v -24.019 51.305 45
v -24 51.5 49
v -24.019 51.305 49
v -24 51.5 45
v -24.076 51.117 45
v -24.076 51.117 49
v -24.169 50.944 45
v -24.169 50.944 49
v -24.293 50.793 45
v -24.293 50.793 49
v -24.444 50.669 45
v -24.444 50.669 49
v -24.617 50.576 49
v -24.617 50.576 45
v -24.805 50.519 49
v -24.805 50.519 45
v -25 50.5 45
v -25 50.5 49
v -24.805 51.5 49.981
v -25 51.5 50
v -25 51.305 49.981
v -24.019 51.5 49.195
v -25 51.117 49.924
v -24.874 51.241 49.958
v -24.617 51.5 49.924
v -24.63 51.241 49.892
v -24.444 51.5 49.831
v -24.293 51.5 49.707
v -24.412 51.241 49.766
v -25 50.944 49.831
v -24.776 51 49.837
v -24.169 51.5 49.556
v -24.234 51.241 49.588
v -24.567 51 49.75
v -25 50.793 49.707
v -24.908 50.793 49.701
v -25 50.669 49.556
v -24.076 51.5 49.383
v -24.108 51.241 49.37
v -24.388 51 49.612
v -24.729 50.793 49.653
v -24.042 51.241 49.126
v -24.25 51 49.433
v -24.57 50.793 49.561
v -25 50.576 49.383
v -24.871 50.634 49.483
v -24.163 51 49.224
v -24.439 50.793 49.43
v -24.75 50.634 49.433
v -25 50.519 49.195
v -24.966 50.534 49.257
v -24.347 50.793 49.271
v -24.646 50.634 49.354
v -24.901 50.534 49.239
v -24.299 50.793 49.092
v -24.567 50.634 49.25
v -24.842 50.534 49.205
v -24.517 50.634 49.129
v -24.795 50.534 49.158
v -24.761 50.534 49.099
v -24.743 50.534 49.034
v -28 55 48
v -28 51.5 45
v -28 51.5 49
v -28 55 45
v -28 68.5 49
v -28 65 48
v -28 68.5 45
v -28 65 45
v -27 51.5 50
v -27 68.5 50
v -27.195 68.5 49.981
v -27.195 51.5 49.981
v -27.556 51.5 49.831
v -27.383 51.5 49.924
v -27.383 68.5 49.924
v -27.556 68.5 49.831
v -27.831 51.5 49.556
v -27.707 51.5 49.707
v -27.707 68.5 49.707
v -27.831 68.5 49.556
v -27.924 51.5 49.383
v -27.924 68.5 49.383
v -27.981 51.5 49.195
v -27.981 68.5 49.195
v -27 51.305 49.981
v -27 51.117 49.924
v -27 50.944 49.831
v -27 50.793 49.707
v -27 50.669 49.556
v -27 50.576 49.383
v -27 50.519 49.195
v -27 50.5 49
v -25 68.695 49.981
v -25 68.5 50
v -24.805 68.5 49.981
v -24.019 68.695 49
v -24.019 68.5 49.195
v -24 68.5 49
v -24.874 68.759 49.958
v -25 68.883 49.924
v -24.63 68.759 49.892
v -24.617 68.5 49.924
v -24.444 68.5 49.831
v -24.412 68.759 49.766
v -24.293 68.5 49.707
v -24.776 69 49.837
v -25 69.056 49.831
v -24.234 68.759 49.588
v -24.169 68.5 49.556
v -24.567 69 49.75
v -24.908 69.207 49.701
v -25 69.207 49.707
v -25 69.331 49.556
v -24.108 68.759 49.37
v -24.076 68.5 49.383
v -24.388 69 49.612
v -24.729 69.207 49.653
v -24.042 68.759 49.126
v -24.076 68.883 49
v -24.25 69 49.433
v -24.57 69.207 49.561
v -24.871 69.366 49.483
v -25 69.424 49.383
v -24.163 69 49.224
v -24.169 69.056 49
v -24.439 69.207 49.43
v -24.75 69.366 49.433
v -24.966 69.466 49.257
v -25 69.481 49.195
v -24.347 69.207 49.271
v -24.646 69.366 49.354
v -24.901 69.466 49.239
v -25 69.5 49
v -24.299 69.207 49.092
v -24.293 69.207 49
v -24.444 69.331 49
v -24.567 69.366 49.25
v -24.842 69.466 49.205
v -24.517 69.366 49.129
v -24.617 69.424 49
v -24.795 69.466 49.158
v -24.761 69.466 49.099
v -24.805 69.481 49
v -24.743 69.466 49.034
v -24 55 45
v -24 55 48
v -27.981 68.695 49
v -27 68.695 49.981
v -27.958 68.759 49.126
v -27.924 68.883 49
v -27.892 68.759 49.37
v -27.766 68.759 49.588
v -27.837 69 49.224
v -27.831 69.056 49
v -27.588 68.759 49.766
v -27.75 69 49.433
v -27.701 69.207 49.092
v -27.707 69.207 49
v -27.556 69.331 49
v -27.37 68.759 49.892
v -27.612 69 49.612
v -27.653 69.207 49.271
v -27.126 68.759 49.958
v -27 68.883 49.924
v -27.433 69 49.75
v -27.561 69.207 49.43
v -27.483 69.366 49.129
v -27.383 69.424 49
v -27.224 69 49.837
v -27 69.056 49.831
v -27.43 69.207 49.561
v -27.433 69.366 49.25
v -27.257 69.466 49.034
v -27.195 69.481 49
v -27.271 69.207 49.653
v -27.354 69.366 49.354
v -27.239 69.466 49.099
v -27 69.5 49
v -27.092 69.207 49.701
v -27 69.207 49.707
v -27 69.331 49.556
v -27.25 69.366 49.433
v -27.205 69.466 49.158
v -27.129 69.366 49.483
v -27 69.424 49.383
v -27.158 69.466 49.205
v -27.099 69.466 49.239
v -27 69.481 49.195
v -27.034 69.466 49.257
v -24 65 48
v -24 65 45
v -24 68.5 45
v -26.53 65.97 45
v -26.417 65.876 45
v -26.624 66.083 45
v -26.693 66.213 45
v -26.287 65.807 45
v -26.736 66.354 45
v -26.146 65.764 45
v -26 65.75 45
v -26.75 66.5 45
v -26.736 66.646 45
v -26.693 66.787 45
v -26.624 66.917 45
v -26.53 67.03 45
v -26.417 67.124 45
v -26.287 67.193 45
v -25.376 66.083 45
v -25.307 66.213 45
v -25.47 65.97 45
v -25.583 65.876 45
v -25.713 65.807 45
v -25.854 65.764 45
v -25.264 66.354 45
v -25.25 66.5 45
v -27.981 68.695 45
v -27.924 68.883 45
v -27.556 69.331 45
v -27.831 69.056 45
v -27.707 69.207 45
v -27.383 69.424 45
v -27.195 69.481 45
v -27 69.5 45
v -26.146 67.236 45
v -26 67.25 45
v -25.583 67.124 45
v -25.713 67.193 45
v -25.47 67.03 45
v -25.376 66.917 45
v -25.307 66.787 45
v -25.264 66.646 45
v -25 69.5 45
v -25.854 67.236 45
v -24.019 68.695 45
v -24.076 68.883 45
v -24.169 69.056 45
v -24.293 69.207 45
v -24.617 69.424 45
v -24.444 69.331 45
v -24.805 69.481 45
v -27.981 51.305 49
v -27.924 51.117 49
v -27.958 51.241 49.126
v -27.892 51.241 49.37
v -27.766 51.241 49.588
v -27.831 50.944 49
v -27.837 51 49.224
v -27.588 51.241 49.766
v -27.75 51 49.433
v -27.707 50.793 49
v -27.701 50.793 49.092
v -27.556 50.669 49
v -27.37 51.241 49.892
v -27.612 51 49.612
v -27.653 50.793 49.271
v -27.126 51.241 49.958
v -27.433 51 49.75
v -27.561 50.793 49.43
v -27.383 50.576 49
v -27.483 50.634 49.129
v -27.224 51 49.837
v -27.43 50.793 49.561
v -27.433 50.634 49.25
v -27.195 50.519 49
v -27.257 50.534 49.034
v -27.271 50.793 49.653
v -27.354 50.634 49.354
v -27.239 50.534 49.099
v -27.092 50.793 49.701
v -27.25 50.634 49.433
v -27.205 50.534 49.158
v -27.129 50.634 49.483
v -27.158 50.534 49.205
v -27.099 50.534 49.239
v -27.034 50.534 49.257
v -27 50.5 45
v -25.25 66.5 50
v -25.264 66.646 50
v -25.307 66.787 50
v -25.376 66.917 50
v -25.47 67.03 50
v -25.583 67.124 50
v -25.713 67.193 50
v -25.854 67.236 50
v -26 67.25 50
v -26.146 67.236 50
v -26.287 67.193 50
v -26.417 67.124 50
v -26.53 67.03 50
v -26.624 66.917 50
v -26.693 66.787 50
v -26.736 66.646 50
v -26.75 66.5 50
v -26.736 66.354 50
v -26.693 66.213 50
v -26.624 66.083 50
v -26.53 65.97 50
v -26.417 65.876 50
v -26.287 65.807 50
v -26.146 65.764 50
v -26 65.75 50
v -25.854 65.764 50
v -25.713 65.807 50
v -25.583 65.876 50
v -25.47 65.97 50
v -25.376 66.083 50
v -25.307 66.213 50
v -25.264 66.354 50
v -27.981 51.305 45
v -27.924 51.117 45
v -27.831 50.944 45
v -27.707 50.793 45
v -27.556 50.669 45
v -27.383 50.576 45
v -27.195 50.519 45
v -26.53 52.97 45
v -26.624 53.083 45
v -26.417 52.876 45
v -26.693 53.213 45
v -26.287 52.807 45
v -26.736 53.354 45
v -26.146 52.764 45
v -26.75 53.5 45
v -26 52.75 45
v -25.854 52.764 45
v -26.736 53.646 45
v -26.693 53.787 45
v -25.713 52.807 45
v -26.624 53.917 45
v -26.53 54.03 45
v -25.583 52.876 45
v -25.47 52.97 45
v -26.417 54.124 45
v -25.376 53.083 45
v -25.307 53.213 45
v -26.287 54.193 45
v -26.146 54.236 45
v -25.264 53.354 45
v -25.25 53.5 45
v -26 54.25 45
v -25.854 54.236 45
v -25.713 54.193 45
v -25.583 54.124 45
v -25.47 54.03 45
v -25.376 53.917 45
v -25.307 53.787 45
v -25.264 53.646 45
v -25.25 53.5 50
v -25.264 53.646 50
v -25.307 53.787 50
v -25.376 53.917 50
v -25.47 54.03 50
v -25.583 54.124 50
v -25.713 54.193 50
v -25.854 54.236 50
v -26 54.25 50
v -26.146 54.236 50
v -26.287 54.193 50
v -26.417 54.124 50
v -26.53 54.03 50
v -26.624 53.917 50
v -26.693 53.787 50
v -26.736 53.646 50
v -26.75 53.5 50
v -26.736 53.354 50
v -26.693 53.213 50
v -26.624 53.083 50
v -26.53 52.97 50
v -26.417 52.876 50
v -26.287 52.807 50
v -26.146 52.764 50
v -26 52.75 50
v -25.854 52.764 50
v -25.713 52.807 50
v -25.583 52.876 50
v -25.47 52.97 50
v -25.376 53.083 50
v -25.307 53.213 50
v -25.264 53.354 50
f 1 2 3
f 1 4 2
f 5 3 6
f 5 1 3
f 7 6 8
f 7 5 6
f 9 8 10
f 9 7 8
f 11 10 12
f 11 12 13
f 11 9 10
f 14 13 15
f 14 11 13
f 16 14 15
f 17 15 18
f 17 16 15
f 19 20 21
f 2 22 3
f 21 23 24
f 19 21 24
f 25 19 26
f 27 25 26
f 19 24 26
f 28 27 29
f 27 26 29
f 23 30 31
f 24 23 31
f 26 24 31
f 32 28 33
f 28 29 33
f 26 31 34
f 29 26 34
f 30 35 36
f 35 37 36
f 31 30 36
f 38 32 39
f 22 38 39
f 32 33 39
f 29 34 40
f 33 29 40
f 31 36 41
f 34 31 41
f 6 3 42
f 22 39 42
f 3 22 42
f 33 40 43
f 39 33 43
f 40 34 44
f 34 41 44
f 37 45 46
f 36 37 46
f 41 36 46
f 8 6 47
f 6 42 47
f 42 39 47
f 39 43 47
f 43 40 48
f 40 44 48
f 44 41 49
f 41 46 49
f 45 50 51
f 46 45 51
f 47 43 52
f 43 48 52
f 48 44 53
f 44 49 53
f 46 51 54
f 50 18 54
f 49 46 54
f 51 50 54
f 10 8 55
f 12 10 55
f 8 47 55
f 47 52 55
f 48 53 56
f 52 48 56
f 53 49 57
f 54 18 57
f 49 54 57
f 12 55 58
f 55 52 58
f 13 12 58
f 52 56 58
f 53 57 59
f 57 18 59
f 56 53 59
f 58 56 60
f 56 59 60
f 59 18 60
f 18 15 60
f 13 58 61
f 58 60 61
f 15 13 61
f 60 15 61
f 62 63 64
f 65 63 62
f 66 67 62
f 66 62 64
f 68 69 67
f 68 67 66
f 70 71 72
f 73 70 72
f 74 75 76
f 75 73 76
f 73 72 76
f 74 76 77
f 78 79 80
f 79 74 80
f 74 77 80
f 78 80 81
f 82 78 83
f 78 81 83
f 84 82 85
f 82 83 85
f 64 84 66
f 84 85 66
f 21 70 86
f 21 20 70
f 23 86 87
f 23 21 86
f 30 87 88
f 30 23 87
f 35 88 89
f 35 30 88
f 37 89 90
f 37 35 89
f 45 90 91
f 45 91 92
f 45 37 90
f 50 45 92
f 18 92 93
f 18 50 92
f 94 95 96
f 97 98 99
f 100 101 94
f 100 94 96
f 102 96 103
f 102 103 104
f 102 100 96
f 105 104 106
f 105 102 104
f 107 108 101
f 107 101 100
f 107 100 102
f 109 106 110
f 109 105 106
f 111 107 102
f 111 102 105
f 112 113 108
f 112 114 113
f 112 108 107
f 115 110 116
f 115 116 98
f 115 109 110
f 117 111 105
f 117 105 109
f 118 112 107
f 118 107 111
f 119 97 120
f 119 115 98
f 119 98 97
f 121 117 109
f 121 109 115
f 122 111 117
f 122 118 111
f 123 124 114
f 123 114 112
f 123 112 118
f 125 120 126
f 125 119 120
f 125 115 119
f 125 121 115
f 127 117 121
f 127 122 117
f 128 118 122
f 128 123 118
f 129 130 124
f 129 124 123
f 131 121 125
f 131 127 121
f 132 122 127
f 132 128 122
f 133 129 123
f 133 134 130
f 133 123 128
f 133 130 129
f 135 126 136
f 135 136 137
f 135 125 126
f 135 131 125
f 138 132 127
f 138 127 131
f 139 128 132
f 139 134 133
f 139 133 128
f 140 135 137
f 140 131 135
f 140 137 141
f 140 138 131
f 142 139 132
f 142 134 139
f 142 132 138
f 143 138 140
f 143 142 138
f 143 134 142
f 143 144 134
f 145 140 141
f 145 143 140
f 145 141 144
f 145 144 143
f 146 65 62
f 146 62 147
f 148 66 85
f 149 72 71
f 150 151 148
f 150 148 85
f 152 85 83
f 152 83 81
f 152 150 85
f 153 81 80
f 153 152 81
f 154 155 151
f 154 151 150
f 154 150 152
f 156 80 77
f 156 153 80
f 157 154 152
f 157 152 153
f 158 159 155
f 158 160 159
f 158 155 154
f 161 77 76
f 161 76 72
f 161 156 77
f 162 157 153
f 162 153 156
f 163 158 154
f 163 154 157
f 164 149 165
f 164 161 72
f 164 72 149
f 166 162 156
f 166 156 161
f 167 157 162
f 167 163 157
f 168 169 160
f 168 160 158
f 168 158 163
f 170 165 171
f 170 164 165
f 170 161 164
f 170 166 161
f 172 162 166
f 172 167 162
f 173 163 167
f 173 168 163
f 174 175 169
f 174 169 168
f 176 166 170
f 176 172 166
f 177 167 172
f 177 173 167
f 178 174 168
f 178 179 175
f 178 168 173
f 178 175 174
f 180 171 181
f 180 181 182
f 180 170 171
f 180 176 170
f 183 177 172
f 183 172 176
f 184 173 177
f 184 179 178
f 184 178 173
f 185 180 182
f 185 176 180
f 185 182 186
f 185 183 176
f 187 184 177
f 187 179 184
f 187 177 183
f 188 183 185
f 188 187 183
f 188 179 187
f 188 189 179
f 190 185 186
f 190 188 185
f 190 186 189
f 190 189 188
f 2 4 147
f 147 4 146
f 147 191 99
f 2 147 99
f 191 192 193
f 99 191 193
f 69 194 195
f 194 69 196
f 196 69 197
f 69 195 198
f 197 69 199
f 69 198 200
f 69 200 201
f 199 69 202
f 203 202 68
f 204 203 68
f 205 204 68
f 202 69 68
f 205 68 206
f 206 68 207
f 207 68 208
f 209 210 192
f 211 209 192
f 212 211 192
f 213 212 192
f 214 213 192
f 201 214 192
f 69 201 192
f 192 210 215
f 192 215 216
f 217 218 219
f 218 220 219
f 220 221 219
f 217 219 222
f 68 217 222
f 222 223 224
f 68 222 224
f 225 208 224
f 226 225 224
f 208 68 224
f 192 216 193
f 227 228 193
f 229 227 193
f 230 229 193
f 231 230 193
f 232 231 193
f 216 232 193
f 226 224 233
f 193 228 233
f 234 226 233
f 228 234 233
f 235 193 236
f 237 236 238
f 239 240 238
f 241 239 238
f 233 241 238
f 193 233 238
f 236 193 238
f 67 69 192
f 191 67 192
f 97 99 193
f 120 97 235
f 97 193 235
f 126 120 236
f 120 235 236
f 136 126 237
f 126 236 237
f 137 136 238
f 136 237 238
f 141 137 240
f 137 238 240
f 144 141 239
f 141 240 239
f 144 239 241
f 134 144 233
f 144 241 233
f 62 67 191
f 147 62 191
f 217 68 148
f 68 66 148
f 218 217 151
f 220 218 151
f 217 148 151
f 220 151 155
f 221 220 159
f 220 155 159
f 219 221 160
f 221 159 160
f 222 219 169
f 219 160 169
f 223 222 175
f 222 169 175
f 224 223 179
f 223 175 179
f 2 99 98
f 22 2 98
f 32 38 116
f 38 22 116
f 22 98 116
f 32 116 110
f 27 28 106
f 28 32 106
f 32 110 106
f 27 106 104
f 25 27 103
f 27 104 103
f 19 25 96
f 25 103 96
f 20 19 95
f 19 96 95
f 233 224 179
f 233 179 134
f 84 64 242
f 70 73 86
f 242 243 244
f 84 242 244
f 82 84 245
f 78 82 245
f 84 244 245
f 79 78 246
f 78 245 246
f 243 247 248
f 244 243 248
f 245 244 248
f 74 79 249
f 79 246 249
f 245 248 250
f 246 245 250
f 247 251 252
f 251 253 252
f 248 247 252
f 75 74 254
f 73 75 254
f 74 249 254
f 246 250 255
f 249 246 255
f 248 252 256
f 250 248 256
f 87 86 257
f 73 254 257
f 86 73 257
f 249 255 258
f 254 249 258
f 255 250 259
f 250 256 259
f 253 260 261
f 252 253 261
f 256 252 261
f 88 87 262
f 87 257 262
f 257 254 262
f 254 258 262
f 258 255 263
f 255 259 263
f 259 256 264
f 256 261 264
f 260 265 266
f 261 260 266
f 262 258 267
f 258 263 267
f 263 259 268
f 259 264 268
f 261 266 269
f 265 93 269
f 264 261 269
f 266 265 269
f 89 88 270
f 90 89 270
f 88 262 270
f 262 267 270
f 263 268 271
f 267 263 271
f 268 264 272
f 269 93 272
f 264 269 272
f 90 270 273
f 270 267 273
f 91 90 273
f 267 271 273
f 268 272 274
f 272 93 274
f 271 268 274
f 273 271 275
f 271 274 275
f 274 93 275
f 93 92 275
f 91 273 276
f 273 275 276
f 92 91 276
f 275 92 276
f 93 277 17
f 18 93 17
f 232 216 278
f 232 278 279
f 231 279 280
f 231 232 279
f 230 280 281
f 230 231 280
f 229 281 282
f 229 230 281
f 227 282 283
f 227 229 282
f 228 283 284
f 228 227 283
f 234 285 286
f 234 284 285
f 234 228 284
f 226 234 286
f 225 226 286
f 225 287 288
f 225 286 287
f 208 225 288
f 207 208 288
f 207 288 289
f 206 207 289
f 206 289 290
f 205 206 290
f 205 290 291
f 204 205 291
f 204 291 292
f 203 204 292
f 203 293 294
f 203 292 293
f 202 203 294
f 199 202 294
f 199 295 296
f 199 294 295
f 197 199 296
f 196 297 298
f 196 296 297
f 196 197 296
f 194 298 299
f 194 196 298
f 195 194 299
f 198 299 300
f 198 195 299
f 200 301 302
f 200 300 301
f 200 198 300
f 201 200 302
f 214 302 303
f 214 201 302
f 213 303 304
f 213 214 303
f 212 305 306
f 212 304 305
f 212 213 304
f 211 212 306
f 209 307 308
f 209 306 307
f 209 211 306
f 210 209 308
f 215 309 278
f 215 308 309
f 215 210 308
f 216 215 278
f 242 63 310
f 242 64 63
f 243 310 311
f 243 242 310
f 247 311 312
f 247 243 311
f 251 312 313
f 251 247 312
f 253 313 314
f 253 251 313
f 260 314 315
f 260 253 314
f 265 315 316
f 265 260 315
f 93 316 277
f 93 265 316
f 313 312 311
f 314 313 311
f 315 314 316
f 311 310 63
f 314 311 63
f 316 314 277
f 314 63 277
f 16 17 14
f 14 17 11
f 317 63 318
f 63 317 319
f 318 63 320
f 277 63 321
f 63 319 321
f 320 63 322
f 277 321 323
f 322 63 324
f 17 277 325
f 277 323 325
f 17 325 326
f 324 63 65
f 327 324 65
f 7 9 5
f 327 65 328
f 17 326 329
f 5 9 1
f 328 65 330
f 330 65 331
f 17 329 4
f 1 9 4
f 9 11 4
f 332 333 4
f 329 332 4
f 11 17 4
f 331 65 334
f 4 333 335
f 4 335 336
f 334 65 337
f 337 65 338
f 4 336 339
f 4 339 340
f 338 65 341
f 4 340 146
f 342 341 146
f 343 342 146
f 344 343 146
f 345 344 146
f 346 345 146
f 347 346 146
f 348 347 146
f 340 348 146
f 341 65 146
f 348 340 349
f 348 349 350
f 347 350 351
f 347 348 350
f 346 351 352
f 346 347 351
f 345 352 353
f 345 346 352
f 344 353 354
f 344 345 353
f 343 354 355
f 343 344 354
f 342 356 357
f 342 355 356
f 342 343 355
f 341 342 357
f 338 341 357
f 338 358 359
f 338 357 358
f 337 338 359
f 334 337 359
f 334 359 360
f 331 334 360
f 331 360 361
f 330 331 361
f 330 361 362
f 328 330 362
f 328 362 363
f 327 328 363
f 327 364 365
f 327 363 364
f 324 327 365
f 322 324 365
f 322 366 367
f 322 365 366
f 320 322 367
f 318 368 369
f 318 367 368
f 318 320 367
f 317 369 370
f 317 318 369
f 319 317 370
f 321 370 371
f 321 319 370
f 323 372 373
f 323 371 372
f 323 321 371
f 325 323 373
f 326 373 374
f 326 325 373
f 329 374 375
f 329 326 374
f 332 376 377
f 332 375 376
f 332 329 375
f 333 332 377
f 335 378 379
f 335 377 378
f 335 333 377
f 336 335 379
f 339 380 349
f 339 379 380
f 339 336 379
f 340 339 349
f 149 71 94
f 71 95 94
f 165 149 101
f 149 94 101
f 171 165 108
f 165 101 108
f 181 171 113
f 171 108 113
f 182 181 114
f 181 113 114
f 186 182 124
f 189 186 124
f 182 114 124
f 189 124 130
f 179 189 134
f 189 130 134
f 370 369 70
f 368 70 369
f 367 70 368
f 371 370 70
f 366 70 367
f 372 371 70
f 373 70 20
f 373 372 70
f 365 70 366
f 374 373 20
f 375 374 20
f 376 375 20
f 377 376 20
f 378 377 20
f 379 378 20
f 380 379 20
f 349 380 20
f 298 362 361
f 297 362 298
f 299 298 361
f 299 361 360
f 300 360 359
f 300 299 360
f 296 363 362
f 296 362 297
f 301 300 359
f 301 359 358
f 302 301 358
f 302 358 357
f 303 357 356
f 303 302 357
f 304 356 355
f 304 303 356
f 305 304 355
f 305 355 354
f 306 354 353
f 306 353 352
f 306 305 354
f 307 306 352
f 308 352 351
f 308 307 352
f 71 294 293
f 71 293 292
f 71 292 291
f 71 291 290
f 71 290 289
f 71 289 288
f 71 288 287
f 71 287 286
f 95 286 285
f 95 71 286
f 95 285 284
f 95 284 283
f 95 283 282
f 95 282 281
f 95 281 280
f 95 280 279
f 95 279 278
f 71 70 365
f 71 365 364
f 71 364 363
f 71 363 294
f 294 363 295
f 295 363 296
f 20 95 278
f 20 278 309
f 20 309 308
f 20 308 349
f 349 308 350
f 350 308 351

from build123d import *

# Parameters (mm, degrees)
CYLINDER040_R     = 0.75
CYLINDER040_DEPTH = 10
CYLINDER037_R     = 0.75
CYLINDER037_DEPTH = 10
BOX038_W          = 5
BOX038_H          = 10
BOX038_DEPTH      = 3
BOX003_W          = 4
BOX003_H          = 19
BOX003_DEPTH      = 5
FILLET_R          = 1
FILLET001_R       = 1
FILLET002_R       = 1
FILLET003_R       = 1


with BuildPart() as cilindro040:
    # Cylinder040 → Cylinder040 (new body)
    with BuildSketch(Plane(origin=(-26, 66, 42), x_dir=(1, 0, 0), z_dir=(0, 0, 1))):
        Circle(CYLINDER040_R)
    extrude(amount=CYLINDER040_DEPTH)


with BuildPart() as cilindro037:
    # Cylinder037 → Cylinder037 (new body)
    with BuildSketch(Plane(origin=(-26, 53, 42), x_dir=(1, 0, 0), z_dir=(0, 0, 1))):
        Circle(CYLINDER037_R)
    extrude(amount=CYLINDER037_DEPTH)


with BuildPart() as cubo038:
    # Box038 → Box038 (new body)
    with BuildSketch(Plane(origin=(-28.5, 54.5, 51), x_dir=(1, 0, 0), z_dir=(0, 0, 1))):
        with Locations((2.5, 5)):
            Rectangle(BOX038_W, BOX038_H)
    extrude(amount=BOX038_DEPTH)


with BuildPart() as cut058:
    # Box003 → Box003 (new body)
    with BuildSketch(Plane(origin=(-2, 50, 45), x_dir=(1, 0, 0), z_dir=(0, 0, 1))):
        with Locations((2, 9.5)):
            Rectangle(BOX003_W, BOX003_H)
    extrude(amount=BOX003_DEPTH)

    # Fillet
    fillet_edges = [cut058.edges().sort_by_distance(p)[0] for p in [
        (2, 59.5, 50),
    ]]
    fillet(fillet_edges, radius=FILLET_R)

    # Fillet001
    fillet001_edges = [cut058.edges().sort_by_distance(p)[0] for p in [
        (-2, 59.5, 50),
    ]]
    fillet(fillet001_edges, radius=FILLET001_R)

    # Fillet002
    fillet002_edges = [cut058.edges().sort_by_distance(p)[0] for p in [
        (0, 69, 50),
    ]]
    fillet(fillet002_edges, radius=FILLET002_R)

    # Fillet003
    fillet003_edges = [cut058.edges().sort_by_distance(p)[0] for p in [
        (0, 50, 50),
    ]]
    fillet(fillet003_edges, radius=FILLET003_R)


with BuildPart() as cut058_1:
    # Fillet003 placement: moved
    add(cut058.part.moved(Location((-26, 0, 6))))

    # Cut055: cut Cubo038
    add(cubo038.part, mode=Mode.SUBTRACT)


with BuildPart() as cut058_2:
    # Cut055 placement: moved
    add(cut058_1.part.moved(Location((0, 0, -6))))

    # Cut057: cut Cilindro037
    add(cilindro037.part, mode=Mode.SUBTRACT)

    # Cut058: cut Cilindro040
    add(cilindro040.part, mode=Mode.SUBTRACT)


with BuildPart() as cut058_3:
    # Cut058 placement: moved
    add(cut058_2.part.moved(Location((0, 0.5, 0))))


solid = cut058_3.part
